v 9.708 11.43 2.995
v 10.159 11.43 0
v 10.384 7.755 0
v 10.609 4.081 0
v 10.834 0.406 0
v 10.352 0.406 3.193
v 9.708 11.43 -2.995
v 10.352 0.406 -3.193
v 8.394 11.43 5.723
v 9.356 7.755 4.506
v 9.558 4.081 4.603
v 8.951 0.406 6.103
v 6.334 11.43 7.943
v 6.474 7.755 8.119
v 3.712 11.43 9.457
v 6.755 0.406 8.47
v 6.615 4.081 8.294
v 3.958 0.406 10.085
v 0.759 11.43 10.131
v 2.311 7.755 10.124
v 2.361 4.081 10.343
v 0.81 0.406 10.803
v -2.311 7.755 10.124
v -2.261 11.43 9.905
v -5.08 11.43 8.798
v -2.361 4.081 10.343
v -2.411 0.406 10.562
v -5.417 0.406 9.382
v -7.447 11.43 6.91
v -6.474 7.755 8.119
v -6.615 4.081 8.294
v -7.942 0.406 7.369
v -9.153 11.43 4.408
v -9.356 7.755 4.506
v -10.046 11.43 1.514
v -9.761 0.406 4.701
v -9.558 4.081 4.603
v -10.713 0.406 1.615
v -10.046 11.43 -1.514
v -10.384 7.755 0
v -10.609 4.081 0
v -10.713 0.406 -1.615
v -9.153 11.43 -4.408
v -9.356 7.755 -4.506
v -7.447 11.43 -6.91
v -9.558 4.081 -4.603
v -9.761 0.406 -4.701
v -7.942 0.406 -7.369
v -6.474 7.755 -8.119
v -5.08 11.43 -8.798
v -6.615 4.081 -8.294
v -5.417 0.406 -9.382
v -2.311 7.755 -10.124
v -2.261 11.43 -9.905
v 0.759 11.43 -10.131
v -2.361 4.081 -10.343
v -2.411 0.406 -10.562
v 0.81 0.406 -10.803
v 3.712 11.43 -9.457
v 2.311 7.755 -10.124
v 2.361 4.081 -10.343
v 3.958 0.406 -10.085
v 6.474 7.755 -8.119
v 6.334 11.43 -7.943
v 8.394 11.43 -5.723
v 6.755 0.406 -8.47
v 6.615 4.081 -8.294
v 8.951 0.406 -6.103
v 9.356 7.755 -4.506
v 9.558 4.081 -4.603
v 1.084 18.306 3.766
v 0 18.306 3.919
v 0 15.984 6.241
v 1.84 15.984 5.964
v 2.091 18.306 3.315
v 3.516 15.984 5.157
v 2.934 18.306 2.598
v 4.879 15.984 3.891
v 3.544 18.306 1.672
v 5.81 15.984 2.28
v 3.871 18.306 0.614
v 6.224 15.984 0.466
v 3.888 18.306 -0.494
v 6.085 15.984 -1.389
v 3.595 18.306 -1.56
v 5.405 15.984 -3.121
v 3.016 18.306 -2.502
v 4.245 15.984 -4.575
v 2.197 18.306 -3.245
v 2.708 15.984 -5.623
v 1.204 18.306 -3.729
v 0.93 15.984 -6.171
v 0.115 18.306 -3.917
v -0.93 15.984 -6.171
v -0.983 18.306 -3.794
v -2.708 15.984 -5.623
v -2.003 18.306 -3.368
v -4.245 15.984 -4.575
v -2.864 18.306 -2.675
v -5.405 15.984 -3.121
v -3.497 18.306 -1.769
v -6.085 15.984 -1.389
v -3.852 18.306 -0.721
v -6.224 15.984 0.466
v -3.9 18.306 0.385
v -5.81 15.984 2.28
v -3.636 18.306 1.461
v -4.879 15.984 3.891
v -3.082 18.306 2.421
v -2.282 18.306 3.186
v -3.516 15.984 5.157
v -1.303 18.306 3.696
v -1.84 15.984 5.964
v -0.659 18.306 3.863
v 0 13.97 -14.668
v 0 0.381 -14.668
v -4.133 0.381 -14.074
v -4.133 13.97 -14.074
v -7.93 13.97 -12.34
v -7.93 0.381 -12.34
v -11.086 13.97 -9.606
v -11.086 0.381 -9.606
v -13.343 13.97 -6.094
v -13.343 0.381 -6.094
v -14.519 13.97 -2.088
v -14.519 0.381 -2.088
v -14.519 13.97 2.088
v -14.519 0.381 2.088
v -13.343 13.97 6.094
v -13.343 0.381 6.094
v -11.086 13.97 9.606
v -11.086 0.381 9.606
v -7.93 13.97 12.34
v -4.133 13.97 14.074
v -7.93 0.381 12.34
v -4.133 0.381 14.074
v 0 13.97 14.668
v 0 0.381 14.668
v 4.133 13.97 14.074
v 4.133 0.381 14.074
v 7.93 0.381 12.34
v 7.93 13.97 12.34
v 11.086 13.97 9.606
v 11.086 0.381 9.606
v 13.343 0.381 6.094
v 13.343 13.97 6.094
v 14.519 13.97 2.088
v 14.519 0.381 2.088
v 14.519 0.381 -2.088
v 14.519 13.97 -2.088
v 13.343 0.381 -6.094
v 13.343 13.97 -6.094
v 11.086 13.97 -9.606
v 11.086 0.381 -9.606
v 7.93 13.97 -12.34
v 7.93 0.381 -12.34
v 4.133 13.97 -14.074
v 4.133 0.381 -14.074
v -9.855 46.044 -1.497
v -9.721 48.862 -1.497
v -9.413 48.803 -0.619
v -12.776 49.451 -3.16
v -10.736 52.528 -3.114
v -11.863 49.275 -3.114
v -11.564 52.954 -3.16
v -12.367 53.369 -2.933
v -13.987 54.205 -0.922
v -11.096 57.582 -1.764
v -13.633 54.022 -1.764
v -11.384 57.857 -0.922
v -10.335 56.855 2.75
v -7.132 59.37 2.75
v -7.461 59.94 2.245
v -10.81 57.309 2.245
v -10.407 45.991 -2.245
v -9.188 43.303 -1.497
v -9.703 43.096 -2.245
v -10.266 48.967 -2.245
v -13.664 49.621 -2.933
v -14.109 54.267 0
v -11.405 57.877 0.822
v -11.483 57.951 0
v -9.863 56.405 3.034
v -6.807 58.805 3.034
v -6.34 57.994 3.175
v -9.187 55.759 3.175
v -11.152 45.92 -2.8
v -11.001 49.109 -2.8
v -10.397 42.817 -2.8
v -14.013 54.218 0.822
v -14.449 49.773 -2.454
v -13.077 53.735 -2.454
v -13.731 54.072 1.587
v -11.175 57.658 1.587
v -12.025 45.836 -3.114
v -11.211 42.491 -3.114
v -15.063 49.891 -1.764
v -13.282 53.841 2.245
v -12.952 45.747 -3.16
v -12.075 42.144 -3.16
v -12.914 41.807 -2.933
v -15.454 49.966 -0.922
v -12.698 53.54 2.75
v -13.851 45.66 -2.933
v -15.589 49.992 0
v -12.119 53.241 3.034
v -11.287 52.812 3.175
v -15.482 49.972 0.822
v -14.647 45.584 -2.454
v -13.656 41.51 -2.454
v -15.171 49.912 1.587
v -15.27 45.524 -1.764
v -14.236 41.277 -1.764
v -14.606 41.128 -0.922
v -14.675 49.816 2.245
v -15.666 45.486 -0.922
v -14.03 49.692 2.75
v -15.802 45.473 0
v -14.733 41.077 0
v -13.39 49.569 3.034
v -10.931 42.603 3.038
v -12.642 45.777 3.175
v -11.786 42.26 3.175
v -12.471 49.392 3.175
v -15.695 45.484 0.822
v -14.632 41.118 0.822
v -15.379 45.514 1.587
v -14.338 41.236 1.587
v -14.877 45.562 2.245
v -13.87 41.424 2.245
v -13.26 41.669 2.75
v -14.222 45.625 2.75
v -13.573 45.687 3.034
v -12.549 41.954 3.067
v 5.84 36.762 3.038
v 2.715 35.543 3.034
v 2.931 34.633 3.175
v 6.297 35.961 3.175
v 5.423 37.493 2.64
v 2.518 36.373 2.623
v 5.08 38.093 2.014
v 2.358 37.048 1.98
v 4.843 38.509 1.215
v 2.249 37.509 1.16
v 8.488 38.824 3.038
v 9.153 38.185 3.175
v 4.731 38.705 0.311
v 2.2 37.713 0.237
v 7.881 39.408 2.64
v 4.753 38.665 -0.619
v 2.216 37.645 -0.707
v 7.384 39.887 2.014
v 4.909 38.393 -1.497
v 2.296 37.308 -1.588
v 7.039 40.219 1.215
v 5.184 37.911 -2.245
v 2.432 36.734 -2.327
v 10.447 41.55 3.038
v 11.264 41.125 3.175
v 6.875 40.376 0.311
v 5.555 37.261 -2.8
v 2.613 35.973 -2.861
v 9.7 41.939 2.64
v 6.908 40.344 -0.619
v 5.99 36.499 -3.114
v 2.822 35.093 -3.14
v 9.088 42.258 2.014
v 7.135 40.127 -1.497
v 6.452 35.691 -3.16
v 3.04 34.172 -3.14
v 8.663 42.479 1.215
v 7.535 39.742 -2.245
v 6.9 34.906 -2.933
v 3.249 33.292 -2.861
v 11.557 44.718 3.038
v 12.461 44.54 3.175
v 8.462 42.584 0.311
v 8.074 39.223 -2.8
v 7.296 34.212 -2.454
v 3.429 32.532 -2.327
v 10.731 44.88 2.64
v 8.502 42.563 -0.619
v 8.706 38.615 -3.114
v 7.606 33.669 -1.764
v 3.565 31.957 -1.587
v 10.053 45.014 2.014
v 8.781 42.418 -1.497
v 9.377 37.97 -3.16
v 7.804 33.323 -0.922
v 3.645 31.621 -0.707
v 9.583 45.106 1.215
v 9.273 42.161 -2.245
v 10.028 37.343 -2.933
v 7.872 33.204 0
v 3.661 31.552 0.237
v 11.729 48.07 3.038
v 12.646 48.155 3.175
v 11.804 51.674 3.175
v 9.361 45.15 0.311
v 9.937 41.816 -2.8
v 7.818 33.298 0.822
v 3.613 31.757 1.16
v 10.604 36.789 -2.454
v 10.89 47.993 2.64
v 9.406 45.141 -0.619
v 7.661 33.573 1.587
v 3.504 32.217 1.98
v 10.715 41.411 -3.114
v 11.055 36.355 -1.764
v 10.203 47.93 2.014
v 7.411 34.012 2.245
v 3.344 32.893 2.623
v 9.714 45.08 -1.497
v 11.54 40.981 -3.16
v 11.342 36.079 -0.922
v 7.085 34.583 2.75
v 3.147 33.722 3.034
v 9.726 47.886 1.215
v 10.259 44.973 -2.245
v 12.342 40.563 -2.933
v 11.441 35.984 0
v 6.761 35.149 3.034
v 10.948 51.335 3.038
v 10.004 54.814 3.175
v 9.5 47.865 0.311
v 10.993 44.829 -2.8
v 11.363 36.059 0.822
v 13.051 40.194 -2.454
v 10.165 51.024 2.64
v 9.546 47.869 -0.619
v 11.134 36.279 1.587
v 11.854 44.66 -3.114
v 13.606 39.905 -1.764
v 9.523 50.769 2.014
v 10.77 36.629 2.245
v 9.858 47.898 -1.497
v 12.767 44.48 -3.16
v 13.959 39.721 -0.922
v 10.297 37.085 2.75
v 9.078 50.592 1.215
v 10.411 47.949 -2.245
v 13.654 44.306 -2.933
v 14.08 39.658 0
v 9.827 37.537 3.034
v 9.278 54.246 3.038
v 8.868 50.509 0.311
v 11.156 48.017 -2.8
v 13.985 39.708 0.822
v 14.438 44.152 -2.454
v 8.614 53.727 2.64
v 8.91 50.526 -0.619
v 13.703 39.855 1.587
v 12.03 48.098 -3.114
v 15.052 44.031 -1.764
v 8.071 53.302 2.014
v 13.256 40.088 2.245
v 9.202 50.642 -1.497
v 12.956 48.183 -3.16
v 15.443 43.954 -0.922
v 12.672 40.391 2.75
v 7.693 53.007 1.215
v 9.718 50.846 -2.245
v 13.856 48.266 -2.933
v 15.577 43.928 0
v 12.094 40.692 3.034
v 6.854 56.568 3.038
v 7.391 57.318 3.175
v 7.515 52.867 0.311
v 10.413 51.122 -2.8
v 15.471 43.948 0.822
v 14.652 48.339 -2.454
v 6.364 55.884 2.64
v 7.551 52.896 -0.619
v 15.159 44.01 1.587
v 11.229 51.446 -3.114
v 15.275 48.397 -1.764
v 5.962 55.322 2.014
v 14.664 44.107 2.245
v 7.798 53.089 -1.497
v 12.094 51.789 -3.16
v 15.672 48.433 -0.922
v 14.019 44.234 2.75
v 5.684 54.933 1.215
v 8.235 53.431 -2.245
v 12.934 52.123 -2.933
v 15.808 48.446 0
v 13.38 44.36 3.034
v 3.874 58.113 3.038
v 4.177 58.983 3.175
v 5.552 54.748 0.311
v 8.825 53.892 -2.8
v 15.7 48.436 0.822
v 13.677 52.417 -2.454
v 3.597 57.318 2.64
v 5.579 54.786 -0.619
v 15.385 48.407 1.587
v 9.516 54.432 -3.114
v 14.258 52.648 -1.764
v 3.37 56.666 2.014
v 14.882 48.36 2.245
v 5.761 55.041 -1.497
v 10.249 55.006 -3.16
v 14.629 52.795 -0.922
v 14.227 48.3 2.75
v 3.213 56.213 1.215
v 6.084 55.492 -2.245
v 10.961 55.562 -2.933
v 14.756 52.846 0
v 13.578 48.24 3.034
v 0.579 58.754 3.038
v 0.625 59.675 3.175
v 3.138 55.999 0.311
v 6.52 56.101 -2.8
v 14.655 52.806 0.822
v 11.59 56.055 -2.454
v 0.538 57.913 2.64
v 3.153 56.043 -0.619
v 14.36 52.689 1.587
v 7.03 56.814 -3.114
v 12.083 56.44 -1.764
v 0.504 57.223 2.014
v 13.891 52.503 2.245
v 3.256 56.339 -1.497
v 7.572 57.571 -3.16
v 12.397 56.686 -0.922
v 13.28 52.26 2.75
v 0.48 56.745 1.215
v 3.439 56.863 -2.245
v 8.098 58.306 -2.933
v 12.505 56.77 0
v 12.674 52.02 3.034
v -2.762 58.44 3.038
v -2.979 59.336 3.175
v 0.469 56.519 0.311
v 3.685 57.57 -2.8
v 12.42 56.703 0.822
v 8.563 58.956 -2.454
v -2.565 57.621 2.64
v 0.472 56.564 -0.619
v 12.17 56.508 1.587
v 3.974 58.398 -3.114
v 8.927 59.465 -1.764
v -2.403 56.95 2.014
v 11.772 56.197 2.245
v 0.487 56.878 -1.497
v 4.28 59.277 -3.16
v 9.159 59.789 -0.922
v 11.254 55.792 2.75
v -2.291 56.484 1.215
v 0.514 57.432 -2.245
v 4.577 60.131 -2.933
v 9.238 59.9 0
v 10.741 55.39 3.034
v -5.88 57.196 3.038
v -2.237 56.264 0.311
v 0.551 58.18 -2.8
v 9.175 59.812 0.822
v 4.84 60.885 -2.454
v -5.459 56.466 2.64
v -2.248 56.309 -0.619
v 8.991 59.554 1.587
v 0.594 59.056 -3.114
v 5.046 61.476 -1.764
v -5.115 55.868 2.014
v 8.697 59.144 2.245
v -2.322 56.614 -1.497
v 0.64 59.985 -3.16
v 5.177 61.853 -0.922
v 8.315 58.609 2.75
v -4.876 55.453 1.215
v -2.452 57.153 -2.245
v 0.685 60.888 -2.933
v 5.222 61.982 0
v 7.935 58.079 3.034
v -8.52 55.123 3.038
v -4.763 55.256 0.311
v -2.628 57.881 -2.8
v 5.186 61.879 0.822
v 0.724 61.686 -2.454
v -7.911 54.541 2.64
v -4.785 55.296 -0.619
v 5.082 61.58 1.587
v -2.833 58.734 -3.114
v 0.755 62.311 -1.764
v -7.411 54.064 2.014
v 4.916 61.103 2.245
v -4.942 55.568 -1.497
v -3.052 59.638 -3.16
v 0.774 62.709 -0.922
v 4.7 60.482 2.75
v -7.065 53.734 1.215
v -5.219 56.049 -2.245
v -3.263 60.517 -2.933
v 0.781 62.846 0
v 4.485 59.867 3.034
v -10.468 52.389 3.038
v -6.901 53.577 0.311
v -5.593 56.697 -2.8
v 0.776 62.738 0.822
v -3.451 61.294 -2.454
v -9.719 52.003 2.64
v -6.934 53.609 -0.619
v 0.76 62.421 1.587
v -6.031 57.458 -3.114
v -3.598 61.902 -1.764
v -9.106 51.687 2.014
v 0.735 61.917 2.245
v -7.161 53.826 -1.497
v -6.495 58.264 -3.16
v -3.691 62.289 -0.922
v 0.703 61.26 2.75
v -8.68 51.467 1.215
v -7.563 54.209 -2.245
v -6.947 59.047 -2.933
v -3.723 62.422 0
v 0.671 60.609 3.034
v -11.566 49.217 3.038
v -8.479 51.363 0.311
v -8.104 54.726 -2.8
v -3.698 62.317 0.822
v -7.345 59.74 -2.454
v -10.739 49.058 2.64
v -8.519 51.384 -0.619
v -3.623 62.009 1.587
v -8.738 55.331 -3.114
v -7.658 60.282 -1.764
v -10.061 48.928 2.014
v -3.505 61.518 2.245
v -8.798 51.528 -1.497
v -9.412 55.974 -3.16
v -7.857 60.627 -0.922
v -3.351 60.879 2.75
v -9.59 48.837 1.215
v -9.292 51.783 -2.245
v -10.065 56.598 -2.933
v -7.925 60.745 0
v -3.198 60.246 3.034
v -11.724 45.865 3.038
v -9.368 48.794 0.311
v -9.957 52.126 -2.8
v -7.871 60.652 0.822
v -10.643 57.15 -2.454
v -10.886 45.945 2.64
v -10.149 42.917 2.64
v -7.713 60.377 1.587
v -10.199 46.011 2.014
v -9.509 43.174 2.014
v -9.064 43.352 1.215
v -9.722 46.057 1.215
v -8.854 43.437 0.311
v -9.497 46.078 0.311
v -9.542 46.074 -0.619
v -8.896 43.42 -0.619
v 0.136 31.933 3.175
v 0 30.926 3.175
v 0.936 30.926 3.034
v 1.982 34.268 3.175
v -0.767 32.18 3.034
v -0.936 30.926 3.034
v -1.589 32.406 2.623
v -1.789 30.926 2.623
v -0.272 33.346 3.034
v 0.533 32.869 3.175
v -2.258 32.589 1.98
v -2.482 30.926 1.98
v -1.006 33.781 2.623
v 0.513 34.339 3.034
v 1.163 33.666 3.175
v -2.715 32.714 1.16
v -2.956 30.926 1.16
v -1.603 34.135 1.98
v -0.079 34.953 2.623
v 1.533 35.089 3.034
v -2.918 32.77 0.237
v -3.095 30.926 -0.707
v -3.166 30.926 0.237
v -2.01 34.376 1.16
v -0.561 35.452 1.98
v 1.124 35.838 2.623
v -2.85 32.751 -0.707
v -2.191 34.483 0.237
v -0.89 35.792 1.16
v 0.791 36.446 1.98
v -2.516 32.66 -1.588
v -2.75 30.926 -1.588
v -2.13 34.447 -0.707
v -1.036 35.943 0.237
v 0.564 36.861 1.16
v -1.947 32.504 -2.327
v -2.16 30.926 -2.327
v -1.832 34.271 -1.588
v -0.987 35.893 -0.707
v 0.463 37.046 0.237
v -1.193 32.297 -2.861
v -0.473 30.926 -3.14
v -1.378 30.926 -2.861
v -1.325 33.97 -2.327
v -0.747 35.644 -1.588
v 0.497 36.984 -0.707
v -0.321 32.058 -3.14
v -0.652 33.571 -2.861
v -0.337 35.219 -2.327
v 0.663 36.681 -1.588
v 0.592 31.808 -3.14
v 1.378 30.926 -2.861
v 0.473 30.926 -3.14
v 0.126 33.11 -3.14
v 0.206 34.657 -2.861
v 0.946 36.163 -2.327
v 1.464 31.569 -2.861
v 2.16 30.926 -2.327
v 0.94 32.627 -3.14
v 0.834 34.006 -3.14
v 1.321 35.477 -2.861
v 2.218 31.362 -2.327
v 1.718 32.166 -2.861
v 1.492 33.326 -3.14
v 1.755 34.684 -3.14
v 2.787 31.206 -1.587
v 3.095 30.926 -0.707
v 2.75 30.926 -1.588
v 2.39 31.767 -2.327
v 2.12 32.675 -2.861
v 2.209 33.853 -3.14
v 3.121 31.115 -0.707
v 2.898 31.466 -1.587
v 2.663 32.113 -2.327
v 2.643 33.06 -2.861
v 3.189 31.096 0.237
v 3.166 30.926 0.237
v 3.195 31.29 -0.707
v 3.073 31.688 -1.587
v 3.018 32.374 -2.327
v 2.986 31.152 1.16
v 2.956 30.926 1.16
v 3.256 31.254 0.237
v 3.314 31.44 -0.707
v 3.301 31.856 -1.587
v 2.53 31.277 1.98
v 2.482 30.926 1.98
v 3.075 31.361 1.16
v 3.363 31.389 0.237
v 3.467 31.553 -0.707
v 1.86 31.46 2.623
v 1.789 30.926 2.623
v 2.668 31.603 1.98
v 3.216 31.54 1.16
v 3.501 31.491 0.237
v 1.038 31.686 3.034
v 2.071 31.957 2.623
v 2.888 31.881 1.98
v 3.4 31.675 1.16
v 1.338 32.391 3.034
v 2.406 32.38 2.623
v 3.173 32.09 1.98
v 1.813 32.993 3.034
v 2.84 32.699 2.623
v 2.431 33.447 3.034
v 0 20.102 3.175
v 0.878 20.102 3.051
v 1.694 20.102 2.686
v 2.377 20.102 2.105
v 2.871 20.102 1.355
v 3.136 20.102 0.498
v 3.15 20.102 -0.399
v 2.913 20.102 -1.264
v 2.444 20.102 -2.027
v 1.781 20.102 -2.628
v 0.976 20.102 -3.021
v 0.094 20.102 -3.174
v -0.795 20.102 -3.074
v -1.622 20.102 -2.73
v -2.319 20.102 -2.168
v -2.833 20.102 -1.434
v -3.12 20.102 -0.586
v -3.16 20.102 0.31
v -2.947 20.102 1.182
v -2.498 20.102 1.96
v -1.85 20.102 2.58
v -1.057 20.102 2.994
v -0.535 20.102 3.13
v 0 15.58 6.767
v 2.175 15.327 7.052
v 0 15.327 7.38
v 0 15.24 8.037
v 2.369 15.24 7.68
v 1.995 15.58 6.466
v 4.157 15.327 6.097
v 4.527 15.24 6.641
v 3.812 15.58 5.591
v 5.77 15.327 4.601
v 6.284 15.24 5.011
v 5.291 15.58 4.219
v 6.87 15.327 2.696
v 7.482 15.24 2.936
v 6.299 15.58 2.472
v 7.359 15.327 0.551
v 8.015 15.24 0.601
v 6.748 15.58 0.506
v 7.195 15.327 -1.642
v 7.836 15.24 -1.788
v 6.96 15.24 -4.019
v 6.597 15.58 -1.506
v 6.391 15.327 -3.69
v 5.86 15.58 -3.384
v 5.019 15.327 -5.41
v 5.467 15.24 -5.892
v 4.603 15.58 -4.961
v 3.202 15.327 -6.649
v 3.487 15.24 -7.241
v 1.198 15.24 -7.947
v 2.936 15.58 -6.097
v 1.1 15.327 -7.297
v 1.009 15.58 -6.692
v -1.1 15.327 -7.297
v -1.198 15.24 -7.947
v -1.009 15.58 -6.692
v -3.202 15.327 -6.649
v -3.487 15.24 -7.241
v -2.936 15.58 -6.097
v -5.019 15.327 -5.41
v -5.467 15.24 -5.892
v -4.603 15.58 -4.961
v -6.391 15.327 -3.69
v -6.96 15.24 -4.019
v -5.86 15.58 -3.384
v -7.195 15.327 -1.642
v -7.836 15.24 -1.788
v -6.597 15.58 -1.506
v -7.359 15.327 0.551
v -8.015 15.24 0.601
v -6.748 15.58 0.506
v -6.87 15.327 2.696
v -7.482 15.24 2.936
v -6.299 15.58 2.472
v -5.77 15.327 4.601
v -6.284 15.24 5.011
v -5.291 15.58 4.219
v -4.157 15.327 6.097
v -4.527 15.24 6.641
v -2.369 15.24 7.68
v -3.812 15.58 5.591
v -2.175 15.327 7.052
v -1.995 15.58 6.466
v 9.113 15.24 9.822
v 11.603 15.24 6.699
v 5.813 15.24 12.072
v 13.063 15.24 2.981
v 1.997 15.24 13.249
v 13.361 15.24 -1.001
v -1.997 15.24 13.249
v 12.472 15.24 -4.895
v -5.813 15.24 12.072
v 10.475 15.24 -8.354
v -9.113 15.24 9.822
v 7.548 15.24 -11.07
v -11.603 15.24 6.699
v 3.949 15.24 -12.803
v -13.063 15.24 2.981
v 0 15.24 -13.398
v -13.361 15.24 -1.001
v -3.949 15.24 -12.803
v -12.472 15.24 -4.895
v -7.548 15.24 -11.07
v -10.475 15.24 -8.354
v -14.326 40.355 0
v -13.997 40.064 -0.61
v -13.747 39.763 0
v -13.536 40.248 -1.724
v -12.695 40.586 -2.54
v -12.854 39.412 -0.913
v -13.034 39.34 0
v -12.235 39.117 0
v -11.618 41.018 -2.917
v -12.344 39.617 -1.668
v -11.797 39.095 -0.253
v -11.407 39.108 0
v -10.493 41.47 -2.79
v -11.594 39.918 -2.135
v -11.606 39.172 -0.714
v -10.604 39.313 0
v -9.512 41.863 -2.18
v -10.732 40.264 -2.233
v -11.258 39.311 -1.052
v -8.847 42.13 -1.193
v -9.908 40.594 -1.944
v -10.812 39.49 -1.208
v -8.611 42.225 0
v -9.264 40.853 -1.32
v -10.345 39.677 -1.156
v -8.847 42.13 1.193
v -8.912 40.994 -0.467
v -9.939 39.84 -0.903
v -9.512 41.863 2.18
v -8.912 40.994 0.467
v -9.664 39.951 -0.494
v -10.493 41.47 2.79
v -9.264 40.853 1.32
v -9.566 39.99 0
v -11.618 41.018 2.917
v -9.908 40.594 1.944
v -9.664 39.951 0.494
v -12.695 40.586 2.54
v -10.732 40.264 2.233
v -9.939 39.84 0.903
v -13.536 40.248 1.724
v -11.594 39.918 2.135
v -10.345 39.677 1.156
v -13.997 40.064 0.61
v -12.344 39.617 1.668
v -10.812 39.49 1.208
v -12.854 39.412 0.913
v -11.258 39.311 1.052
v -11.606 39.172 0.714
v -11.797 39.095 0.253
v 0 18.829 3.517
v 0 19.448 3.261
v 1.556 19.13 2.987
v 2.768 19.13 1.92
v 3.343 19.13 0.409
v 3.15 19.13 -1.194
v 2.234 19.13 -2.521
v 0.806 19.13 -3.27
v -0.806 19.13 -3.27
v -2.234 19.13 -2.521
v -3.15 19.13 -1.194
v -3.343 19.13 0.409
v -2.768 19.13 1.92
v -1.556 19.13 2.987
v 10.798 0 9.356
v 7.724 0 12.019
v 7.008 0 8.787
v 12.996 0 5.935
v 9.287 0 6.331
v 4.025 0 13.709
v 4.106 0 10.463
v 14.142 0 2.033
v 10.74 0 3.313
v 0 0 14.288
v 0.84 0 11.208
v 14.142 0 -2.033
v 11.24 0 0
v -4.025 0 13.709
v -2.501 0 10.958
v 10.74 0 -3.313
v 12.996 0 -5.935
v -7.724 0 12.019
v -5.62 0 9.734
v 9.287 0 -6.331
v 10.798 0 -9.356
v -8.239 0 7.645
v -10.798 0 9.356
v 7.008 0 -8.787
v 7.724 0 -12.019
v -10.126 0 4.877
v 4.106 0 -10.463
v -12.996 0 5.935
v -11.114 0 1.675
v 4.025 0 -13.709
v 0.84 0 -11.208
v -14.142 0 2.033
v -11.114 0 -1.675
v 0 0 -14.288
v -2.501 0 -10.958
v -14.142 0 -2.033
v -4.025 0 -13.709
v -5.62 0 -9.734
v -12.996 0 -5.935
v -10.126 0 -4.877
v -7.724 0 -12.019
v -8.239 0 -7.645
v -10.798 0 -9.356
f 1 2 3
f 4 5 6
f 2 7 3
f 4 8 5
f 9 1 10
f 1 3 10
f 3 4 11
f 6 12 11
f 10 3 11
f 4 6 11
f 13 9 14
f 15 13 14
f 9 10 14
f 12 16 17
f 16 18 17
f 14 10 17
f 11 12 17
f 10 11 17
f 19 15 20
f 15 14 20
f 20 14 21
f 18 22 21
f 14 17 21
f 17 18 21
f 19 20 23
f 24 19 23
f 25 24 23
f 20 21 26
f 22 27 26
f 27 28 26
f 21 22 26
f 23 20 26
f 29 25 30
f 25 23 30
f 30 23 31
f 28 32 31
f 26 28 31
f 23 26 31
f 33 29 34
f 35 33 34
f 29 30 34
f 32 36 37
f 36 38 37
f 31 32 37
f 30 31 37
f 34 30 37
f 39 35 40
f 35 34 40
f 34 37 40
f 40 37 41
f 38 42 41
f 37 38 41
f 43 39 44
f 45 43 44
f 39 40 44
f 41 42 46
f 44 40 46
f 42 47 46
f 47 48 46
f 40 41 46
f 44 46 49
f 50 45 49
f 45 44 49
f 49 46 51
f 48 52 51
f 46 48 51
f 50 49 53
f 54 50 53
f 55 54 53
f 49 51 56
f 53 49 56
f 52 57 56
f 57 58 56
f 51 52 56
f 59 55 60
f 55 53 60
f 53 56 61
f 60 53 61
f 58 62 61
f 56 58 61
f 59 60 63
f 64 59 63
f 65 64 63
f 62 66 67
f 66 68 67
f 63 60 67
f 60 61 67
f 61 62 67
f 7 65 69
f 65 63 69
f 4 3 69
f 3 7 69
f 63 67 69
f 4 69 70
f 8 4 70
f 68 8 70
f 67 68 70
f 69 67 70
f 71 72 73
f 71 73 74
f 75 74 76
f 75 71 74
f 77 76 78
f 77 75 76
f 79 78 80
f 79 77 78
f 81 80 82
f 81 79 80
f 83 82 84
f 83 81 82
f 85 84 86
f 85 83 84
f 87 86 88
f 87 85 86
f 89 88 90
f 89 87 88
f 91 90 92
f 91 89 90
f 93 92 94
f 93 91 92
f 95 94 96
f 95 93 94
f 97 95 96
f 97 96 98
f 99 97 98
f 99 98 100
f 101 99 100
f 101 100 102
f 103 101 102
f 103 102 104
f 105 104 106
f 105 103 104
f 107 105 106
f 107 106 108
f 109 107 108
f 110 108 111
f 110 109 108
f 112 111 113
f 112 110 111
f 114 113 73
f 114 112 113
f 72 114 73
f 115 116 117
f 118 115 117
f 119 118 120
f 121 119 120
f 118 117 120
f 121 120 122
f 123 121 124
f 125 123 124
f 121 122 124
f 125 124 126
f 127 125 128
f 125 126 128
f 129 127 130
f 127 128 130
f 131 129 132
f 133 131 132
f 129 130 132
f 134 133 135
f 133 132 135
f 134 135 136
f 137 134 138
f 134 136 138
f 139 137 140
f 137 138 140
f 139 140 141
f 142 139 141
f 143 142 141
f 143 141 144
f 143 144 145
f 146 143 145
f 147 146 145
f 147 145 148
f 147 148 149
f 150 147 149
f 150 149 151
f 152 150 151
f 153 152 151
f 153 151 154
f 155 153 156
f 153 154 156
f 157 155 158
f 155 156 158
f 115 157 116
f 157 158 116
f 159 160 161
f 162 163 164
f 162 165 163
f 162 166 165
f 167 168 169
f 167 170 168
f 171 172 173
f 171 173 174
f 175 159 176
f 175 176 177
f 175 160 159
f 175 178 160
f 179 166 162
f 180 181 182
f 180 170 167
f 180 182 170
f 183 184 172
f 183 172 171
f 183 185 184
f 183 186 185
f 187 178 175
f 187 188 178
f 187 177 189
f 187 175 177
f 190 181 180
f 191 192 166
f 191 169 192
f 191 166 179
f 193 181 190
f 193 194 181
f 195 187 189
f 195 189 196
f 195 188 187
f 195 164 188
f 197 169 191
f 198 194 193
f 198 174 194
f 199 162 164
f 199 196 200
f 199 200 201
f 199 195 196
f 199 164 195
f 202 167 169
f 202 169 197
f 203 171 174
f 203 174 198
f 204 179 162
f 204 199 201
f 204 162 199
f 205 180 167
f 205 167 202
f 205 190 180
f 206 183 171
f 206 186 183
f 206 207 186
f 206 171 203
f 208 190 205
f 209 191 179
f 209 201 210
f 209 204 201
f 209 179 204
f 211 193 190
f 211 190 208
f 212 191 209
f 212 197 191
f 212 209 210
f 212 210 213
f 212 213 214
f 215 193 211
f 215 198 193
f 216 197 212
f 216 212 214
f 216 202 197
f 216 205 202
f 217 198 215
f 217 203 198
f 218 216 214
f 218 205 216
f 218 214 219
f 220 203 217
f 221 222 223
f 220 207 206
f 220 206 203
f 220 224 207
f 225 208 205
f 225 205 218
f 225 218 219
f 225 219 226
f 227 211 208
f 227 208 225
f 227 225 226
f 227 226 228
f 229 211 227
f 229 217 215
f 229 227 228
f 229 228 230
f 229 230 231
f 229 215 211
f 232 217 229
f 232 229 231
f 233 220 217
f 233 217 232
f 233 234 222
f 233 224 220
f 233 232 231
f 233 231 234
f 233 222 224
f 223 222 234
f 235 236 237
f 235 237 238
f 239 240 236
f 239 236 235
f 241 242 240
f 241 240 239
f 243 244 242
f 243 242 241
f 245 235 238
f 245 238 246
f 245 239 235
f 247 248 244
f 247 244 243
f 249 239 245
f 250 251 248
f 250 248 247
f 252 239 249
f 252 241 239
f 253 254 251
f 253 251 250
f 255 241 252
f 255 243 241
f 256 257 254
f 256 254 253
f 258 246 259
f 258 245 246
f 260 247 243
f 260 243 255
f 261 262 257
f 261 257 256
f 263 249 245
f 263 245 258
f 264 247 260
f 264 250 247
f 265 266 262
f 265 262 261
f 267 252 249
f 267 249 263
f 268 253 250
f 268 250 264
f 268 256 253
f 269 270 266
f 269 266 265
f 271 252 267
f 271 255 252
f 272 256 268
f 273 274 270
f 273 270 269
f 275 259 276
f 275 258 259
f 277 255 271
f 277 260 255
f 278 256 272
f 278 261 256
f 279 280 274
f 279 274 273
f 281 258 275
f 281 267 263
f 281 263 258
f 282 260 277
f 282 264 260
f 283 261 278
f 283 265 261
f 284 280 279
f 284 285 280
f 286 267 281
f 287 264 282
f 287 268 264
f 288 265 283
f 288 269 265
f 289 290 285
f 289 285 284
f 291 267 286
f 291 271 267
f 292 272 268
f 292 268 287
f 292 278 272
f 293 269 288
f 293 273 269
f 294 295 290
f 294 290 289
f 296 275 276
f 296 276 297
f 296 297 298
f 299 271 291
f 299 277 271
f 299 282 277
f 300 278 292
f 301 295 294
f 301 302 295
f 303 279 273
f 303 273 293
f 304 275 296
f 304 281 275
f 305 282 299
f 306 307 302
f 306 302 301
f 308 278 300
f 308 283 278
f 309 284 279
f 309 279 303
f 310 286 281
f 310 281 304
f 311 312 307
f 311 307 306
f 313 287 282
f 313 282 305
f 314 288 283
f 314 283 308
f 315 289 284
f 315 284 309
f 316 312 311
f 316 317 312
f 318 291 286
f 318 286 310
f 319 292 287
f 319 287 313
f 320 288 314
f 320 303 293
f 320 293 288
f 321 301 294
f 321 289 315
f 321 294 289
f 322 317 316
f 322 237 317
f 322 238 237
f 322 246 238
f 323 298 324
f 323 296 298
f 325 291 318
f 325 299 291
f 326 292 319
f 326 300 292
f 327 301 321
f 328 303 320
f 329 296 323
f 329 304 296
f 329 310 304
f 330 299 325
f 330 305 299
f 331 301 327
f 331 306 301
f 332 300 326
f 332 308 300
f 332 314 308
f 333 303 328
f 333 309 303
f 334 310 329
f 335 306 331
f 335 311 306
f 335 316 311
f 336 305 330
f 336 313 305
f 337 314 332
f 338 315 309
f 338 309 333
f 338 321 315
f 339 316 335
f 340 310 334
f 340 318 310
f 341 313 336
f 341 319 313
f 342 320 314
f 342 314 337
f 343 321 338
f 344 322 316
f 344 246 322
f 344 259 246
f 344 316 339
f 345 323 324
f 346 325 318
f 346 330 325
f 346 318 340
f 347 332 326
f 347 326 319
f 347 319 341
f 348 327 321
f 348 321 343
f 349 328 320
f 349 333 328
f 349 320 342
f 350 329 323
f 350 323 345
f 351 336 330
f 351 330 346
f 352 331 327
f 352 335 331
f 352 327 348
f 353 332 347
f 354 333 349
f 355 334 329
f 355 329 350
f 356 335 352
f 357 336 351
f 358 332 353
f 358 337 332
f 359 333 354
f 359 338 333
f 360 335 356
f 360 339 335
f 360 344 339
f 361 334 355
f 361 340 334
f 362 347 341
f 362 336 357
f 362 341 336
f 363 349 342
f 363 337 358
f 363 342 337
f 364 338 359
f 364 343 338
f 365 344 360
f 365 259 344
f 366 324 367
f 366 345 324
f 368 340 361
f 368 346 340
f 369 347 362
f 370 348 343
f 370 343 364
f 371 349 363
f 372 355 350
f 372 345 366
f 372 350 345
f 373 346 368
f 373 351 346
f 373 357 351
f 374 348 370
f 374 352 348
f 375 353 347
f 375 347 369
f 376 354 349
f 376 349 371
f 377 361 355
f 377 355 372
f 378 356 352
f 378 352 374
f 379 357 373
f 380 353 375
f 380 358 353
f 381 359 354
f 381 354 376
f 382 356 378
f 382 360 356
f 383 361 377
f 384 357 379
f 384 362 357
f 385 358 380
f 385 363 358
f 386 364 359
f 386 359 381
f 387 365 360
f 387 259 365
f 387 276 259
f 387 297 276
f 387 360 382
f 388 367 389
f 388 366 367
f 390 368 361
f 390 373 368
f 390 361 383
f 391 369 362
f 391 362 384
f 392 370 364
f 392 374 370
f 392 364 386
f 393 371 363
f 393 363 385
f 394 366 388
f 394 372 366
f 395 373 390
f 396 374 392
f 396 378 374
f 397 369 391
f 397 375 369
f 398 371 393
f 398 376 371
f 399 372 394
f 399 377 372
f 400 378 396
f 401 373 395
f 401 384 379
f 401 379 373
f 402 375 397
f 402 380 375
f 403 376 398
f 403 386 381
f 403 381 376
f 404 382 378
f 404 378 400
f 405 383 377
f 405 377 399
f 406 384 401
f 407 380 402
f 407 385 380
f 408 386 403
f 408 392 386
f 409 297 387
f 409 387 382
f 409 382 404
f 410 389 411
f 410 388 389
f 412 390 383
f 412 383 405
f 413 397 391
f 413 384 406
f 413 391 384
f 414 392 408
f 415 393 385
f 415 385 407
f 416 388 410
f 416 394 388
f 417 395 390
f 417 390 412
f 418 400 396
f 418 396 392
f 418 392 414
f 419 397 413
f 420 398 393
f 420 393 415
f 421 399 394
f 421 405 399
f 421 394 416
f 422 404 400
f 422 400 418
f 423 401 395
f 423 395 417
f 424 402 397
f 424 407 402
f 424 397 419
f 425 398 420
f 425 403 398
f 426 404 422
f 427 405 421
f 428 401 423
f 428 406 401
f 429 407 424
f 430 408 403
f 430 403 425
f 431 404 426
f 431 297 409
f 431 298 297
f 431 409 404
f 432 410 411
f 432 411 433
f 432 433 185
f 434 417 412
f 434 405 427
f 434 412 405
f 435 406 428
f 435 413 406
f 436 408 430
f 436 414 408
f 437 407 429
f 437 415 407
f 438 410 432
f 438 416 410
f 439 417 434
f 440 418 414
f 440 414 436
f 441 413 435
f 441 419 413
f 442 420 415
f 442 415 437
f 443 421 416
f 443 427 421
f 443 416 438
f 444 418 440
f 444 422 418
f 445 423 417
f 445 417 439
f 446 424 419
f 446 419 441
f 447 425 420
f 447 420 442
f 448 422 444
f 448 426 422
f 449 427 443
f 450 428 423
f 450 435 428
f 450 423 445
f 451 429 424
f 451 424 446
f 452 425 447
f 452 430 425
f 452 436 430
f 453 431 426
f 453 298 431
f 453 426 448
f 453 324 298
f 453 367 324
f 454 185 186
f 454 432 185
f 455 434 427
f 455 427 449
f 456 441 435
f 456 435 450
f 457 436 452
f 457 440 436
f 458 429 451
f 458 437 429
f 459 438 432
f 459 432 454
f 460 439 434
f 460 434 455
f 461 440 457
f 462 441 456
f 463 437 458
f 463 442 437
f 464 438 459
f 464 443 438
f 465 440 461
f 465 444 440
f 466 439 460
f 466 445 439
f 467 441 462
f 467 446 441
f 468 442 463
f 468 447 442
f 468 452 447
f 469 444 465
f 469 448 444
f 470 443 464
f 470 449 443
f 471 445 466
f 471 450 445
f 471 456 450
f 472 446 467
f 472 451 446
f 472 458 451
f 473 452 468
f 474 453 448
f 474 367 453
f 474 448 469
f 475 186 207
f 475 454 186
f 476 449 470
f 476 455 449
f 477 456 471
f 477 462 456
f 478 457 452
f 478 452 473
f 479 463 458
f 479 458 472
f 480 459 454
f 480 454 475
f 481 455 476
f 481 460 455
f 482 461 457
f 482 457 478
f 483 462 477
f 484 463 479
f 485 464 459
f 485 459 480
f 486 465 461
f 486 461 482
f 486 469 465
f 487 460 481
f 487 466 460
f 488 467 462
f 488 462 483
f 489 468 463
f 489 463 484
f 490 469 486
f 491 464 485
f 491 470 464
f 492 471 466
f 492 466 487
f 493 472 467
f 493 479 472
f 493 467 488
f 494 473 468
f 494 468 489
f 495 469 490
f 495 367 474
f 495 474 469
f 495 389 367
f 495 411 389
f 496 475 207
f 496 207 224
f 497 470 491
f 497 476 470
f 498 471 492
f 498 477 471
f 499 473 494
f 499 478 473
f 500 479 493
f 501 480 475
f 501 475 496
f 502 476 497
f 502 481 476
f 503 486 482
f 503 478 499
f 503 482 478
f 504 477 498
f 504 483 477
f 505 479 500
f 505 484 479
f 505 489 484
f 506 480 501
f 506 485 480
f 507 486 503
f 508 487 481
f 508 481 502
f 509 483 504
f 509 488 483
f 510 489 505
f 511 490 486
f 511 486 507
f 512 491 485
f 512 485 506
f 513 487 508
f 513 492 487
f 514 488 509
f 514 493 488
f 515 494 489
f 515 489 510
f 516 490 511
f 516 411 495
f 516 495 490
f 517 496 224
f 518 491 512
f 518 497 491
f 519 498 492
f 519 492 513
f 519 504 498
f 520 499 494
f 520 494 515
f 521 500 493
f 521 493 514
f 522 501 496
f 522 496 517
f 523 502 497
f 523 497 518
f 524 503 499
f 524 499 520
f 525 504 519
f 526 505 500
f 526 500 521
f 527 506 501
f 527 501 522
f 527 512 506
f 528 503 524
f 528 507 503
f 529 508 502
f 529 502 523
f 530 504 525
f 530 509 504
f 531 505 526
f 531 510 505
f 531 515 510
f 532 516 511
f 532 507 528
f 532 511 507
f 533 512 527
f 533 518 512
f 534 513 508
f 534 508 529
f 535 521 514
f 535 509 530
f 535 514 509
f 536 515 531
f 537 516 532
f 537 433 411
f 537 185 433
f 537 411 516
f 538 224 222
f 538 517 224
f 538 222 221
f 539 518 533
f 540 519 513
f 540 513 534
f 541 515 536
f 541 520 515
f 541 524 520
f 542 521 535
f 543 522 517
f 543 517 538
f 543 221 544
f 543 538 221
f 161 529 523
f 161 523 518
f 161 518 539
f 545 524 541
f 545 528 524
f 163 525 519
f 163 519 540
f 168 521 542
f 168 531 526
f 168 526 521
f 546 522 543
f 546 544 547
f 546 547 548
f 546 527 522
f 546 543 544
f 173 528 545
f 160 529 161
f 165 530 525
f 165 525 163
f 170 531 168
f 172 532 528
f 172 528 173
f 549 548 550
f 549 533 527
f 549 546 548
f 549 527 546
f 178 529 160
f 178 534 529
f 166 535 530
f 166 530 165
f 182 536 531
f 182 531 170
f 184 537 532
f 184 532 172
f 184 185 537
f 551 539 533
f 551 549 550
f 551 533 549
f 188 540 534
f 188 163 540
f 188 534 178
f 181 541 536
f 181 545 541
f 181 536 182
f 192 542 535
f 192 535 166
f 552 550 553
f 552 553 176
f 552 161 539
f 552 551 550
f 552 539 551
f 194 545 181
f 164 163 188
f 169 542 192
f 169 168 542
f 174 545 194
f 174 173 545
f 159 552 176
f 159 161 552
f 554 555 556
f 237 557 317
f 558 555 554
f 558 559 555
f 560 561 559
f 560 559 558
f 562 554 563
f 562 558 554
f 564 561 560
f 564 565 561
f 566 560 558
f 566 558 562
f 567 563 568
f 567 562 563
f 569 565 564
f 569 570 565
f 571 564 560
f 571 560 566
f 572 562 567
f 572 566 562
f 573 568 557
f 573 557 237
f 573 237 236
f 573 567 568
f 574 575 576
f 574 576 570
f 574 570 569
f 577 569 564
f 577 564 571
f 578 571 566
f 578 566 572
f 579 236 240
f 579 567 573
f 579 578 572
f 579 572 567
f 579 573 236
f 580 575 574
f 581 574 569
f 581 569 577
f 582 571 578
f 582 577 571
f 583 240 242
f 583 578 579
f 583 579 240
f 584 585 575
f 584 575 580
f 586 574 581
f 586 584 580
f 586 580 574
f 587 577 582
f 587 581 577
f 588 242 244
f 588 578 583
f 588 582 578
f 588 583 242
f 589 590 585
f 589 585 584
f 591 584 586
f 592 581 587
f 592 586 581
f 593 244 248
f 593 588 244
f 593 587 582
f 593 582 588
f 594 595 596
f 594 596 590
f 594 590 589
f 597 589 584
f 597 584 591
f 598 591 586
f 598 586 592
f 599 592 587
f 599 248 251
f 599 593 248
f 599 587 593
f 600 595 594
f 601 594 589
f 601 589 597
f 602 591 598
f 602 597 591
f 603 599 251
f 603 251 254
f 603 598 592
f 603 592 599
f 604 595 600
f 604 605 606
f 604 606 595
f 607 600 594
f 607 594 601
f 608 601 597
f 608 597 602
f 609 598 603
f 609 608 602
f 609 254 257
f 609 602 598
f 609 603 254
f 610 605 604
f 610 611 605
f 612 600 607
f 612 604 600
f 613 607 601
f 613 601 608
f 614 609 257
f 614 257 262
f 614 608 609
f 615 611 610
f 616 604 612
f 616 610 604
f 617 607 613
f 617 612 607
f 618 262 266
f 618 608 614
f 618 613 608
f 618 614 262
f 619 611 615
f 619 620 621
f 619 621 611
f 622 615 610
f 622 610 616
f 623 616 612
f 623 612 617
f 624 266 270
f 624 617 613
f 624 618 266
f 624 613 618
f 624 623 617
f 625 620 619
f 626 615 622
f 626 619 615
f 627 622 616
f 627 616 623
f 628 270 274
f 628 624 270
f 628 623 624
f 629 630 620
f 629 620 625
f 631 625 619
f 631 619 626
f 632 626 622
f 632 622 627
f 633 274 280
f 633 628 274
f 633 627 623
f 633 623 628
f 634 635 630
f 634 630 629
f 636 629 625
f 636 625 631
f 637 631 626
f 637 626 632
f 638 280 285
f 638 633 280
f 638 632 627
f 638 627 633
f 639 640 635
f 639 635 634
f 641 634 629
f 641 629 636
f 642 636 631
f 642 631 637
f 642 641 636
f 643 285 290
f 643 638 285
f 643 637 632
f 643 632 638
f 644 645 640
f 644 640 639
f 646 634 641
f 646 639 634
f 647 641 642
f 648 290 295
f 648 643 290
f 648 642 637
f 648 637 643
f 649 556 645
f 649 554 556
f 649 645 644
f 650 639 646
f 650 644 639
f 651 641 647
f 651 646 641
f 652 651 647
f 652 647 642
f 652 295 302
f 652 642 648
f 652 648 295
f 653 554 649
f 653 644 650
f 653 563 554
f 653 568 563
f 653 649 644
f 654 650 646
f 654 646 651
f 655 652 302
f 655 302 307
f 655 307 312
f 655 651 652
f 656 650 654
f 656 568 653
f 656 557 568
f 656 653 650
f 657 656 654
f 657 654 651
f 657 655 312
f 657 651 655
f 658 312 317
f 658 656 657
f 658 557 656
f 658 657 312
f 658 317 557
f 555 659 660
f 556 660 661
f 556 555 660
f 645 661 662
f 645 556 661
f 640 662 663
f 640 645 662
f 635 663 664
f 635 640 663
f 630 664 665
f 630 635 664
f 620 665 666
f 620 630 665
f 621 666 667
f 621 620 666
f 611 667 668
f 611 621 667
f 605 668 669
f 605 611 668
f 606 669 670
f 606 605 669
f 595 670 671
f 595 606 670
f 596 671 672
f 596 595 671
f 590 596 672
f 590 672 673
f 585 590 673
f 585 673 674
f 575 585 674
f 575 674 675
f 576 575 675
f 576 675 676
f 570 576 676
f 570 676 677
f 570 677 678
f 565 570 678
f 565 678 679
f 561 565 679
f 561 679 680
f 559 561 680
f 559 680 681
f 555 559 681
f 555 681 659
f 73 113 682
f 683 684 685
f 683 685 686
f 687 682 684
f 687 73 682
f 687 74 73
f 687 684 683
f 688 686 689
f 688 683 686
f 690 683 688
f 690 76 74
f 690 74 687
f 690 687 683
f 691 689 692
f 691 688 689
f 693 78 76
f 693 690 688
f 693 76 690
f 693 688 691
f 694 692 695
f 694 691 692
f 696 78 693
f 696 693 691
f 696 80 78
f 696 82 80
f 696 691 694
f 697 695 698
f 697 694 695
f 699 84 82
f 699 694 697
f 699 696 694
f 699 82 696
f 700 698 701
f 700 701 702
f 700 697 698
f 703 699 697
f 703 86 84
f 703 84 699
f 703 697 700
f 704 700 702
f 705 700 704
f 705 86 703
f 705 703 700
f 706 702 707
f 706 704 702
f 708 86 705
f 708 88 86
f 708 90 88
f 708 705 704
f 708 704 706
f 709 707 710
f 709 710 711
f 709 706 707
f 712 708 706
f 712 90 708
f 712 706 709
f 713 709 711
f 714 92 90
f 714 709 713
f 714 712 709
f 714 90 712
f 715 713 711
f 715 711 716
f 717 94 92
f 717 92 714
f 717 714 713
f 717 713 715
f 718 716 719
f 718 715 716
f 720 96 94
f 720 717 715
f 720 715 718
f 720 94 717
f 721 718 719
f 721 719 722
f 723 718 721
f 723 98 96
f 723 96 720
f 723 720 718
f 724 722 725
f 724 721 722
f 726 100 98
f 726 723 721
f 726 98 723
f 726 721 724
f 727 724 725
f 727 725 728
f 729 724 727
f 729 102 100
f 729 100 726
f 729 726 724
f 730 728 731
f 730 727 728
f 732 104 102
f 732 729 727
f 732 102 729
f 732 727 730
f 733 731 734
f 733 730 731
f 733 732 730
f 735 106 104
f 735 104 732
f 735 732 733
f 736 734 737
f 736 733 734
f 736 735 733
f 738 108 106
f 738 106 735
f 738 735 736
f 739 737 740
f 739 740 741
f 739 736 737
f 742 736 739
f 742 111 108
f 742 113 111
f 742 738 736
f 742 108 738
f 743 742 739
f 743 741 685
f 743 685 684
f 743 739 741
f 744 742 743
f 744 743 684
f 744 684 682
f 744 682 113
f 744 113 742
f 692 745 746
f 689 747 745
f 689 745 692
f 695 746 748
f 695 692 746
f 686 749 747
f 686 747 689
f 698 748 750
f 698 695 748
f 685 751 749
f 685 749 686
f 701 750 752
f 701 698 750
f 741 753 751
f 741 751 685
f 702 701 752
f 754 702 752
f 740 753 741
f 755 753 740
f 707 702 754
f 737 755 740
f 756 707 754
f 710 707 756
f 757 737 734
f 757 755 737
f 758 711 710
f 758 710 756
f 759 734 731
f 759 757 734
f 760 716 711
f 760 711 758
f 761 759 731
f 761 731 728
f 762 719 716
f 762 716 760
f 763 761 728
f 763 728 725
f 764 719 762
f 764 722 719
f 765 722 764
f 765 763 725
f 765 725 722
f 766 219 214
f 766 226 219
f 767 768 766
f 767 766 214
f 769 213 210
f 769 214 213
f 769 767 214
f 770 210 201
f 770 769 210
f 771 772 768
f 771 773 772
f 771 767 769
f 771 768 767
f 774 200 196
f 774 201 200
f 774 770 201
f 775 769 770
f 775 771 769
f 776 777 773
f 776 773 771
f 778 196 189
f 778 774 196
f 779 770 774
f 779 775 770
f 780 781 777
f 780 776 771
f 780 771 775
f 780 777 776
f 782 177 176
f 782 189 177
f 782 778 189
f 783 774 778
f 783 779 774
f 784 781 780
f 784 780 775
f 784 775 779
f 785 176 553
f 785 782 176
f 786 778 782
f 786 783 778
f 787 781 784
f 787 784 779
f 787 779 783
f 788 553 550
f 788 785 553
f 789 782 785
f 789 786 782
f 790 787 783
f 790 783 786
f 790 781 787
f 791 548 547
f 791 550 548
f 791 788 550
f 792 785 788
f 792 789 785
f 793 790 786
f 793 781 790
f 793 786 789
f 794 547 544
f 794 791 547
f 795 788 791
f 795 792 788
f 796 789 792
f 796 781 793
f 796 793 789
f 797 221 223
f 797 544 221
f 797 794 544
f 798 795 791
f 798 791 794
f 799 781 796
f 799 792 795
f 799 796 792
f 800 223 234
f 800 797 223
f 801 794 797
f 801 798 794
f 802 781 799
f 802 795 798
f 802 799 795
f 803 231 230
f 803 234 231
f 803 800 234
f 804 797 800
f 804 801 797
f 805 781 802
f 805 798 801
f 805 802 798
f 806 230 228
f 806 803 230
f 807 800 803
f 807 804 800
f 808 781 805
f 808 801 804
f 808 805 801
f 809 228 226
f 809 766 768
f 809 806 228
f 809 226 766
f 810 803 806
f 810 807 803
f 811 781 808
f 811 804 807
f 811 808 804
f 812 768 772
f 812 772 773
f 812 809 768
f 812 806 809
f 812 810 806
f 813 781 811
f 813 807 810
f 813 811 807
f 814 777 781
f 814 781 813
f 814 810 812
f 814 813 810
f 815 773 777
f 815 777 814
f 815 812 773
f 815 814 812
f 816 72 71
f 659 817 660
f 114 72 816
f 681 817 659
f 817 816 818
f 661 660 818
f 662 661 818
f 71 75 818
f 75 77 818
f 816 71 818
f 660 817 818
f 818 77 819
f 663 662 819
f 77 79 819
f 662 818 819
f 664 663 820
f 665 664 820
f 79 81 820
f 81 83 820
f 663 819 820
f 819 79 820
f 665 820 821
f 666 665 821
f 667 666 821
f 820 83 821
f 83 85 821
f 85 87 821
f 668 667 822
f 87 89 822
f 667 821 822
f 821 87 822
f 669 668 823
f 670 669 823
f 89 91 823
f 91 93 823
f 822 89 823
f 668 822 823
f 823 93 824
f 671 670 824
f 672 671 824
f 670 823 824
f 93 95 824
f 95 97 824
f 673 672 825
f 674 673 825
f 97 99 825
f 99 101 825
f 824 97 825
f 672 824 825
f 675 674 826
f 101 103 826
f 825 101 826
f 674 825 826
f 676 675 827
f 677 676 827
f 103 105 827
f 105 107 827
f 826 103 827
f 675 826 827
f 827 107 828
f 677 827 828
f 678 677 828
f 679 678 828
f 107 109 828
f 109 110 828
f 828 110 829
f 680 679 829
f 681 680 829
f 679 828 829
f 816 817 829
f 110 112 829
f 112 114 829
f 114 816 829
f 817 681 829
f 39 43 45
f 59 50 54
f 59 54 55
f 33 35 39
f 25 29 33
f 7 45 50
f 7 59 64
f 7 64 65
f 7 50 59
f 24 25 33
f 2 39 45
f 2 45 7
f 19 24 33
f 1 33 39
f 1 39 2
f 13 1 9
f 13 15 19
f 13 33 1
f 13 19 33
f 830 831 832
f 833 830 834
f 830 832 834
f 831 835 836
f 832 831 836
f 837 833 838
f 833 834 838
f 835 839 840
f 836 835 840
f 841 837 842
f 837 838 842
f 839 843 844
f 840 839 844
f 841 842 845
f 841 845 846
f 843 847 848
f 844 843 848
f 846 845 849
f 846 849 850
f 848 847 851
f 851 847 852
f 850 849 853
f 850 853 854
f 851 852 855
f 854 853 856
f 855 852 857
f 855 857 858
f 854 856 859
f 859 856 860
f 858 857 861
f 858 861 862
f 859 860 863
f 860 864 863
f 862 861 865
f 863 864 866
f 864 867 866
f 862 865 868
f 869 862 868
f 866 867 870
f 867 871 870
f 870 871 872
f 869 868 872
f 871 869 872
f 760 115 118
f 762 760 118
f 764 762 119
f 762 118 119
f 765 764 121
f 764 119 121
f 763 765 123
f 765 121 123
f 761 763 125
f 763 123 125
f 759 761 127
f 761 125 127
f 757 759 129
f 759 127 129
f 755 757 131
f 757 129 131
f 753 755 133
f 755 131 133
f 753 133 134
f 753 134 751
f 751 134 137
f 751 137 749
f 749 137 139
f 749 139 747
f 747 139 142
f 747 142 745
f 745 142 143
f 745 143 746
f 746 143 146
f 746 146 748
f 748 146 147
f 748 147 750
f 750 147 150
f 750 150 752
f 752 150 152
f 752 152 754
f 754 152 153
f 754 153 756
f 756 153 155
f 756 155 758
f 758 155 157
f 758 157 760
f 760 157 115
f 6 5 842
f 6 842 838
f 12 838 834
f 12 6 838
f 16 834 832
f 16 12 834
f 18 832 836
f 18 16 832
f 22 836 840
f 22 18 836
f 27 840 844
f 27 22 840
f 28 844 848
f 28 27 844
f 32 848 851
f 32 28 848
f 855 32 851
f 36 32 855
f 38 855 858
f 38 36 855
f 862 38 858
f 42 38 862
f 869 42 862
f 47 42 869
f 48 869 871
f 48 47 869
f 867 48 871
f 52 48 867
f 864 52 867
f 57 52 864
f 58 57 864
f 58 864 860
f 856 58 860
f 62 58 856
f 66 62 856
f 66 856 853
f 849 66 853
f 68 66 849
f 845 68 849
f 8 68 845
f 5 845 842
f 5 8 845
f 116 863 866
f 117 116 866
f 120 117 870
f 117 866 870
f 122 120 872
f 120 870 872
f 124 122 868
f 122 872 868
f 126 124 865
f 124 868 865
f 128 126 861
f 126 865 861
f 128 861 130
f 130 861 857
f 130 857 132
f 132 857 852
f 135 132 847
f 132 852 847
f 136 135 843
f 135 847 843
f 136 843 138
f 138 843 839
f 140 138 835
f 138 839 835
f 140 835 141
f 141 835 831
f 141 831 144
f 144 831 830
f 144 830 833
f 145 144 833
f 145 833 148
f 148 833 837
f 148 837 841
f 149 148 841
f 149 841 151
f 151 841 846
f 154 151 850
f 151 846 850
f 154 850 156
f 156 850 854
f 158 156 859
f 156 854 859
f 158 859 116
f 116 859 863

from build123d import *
from OCP.BRepFilletAPI import BRepFilletAPI_MakeChamfer

# Parameters (mm, degrees)
SKETCH1_R           = 14.6685
BOSS_EXTRUDE1_DEPTH = 15.24
SKETCH2_R           = 10.8585
CUT_EXTRUDE1_DEPTH  = 11.43
CUT_EXTRUDE1_DRAFT  = -3.5
SWEEP1_PROFILE_R    = 3.175
DOME1_FACE_RADIUS   = 3.175
DOME1_HEIGHT        = 3.175
CHAMFER1_SIZE       = 1.27
CHAMFER2_SIZE       = 0.381
CHAMFER2_SIZE2      = 0.406579433
CHAMFER3_SIZE       = 3.81
FILLET1_R           = 2.54


with BuildPart() as part:
    # Sketch1 → Boss-Extrude1 (new body)
    with BuildSketch(Plane(origin=(0, 0, 0), x_dir=(1, 0, 0), z_dir=(0, 1, 0))):
        with Locations(Location((0, 0, 0), (0, 0, 90))):
            Circle(SKETCH1_R)
    extrude(amount=BOSS_EXTRUDE1_DEPTH)


with BuildPart() as cut_extrude1_tool:
    # Sketch2 → Cut-Extrude1 (with draft: the straight prism first)
    with BuildSketch(Plane.XZ):
        Circle(SKETCH2_R)
    extrude(amount=-CUT_EXTRUDE1_DEPTH)
    # Cut-Extrude1: the draft: its side faces are tilted about the plane it starts from
    cut_extrude1_sides = [cut_extrude1_tool.faces().sort_by_distance(p)[0] for p in [
        (-10.8585, 5.715, 0),
    ]]
    draft(cut_extrude1_sides, Plane.XZ, CUT_EXTRUDE1_DRAFT)


with BuildPart() as part_1:
    add(part.part)

    # Cut-Extrude1: cut by cut_extrude1_tool
    add(cut_extrude1_tool.part, mode=Mode.SUBTRACT)

    # Sweep1: sweep along a path in Sketch3
    with BuildLine(Plane.XY) as sweep1_path:
        Line((0, 15.24), (0, 30.925629486))
        ThreePointArc((0, 30.925629486), (0.8211901, 33.28849118), (2.930769231, 34.632791913))
        ThreePointArc((2.930769231, 34.632791913), (5.843650644, 58.265714929), (-11.786275909, 42.259915412))
    # Sweep1 profile (on start of the path) → Sweep1 (sweep)
    with BuildSketch(Plane.ZX.offset(15.24)):
        Circle(SWEEP1_PROFILE_R)
    sweep(path=sweep1_path.line)

    # Dome1: a dome of height H over a round flat face of radius A is a cap of a sphere of radius (A * A + H * H) / (2 * H)
    dome1_r = (DOME1_FACE_RADIUS * DOME1_FACE_RADIUS + DOME1_HEIGHT * DOME1_HEIGHT) / (2 * DOME1_HEIGHT)
    dome1_base = Plane((-11.786275909, 42.259915412, 0), z_dir=(0.372447605321, -0.928053221152, 0))
    with Locations(dome1_base.offset(DOME1_HEIGHT - dome1_r)):
        dome1_ball = Sphere(dome1_r, mode=Mode.PRIVATE)
    add(split(dome1_ball, bisect_by=dome1_base, keep=Keep.TOP, mode=Mode.PRIVATE))

    # Chamfer1
    chamfer1_edges = [part_1.edges().sort_by_distance(p)[0] for p in [
        (0, 15.24, 14.6685),
    ]]
    chamfer(chamfer1_edges, length=CHAMFER1_SIZE)

    # Chamfer2: one chamfer whose edges measure the first distance from different faces: ONE call of the kernel's chamfer builder (chamfer() names one face for all edges)
    chamfer2_edges_1 = [part_1.edges().sort_by_distance(p)[0] for p in [
        (0, 0, 14.6685),
    ]]
    chamfer2_edges_2 = [part_1.edges().sort_by_distance(p)[0] for p in [
        (-10.8585, 0, 0),
    ]]
    chamfer2_side_2 = [part_1.faces().sort_by_distance(p)[0] for p in [
        (0, 0, 14.253612167),
    ]]
    chamfer2 = BRepFilletAPI_MakeChamfer(part_1.part.solid().wrapped)
    for e in chamfer2_edges_1:
        chamfer2.Add(CHAMFER2_SIZE, e.wrapped)
    for e in chamfer2_edges_2:
        chamfer2.Add(CHAMFER2_SIZE, CHAMFER2_SIZE2, e.wrapped, chamfer2_side_2[0].wrapped)  # the first distance lies on this face
    add(Compound.cast(chamfer2.Shape()), mode=Mode.REPLACE)

    # Chamfer3
    chamfer3_edges = [part_1.edges().sort_by_distance(p)[0] for p in [
        (0, 15.24, -3.175),
    ]]
    chamfer(chamfer3_edges, length=CHAMFER3_SIZE)

    # Fillet1
    fillet1_edges = [part_1.edges().sort_by_distance(p)[0] for p in [
        (0, 15.24, -6.985),
        (0, 19.05, -3.175),
    ]]
    fillet(fillet1_edges, radius=FILLET1_R)


solid = part_1.part
